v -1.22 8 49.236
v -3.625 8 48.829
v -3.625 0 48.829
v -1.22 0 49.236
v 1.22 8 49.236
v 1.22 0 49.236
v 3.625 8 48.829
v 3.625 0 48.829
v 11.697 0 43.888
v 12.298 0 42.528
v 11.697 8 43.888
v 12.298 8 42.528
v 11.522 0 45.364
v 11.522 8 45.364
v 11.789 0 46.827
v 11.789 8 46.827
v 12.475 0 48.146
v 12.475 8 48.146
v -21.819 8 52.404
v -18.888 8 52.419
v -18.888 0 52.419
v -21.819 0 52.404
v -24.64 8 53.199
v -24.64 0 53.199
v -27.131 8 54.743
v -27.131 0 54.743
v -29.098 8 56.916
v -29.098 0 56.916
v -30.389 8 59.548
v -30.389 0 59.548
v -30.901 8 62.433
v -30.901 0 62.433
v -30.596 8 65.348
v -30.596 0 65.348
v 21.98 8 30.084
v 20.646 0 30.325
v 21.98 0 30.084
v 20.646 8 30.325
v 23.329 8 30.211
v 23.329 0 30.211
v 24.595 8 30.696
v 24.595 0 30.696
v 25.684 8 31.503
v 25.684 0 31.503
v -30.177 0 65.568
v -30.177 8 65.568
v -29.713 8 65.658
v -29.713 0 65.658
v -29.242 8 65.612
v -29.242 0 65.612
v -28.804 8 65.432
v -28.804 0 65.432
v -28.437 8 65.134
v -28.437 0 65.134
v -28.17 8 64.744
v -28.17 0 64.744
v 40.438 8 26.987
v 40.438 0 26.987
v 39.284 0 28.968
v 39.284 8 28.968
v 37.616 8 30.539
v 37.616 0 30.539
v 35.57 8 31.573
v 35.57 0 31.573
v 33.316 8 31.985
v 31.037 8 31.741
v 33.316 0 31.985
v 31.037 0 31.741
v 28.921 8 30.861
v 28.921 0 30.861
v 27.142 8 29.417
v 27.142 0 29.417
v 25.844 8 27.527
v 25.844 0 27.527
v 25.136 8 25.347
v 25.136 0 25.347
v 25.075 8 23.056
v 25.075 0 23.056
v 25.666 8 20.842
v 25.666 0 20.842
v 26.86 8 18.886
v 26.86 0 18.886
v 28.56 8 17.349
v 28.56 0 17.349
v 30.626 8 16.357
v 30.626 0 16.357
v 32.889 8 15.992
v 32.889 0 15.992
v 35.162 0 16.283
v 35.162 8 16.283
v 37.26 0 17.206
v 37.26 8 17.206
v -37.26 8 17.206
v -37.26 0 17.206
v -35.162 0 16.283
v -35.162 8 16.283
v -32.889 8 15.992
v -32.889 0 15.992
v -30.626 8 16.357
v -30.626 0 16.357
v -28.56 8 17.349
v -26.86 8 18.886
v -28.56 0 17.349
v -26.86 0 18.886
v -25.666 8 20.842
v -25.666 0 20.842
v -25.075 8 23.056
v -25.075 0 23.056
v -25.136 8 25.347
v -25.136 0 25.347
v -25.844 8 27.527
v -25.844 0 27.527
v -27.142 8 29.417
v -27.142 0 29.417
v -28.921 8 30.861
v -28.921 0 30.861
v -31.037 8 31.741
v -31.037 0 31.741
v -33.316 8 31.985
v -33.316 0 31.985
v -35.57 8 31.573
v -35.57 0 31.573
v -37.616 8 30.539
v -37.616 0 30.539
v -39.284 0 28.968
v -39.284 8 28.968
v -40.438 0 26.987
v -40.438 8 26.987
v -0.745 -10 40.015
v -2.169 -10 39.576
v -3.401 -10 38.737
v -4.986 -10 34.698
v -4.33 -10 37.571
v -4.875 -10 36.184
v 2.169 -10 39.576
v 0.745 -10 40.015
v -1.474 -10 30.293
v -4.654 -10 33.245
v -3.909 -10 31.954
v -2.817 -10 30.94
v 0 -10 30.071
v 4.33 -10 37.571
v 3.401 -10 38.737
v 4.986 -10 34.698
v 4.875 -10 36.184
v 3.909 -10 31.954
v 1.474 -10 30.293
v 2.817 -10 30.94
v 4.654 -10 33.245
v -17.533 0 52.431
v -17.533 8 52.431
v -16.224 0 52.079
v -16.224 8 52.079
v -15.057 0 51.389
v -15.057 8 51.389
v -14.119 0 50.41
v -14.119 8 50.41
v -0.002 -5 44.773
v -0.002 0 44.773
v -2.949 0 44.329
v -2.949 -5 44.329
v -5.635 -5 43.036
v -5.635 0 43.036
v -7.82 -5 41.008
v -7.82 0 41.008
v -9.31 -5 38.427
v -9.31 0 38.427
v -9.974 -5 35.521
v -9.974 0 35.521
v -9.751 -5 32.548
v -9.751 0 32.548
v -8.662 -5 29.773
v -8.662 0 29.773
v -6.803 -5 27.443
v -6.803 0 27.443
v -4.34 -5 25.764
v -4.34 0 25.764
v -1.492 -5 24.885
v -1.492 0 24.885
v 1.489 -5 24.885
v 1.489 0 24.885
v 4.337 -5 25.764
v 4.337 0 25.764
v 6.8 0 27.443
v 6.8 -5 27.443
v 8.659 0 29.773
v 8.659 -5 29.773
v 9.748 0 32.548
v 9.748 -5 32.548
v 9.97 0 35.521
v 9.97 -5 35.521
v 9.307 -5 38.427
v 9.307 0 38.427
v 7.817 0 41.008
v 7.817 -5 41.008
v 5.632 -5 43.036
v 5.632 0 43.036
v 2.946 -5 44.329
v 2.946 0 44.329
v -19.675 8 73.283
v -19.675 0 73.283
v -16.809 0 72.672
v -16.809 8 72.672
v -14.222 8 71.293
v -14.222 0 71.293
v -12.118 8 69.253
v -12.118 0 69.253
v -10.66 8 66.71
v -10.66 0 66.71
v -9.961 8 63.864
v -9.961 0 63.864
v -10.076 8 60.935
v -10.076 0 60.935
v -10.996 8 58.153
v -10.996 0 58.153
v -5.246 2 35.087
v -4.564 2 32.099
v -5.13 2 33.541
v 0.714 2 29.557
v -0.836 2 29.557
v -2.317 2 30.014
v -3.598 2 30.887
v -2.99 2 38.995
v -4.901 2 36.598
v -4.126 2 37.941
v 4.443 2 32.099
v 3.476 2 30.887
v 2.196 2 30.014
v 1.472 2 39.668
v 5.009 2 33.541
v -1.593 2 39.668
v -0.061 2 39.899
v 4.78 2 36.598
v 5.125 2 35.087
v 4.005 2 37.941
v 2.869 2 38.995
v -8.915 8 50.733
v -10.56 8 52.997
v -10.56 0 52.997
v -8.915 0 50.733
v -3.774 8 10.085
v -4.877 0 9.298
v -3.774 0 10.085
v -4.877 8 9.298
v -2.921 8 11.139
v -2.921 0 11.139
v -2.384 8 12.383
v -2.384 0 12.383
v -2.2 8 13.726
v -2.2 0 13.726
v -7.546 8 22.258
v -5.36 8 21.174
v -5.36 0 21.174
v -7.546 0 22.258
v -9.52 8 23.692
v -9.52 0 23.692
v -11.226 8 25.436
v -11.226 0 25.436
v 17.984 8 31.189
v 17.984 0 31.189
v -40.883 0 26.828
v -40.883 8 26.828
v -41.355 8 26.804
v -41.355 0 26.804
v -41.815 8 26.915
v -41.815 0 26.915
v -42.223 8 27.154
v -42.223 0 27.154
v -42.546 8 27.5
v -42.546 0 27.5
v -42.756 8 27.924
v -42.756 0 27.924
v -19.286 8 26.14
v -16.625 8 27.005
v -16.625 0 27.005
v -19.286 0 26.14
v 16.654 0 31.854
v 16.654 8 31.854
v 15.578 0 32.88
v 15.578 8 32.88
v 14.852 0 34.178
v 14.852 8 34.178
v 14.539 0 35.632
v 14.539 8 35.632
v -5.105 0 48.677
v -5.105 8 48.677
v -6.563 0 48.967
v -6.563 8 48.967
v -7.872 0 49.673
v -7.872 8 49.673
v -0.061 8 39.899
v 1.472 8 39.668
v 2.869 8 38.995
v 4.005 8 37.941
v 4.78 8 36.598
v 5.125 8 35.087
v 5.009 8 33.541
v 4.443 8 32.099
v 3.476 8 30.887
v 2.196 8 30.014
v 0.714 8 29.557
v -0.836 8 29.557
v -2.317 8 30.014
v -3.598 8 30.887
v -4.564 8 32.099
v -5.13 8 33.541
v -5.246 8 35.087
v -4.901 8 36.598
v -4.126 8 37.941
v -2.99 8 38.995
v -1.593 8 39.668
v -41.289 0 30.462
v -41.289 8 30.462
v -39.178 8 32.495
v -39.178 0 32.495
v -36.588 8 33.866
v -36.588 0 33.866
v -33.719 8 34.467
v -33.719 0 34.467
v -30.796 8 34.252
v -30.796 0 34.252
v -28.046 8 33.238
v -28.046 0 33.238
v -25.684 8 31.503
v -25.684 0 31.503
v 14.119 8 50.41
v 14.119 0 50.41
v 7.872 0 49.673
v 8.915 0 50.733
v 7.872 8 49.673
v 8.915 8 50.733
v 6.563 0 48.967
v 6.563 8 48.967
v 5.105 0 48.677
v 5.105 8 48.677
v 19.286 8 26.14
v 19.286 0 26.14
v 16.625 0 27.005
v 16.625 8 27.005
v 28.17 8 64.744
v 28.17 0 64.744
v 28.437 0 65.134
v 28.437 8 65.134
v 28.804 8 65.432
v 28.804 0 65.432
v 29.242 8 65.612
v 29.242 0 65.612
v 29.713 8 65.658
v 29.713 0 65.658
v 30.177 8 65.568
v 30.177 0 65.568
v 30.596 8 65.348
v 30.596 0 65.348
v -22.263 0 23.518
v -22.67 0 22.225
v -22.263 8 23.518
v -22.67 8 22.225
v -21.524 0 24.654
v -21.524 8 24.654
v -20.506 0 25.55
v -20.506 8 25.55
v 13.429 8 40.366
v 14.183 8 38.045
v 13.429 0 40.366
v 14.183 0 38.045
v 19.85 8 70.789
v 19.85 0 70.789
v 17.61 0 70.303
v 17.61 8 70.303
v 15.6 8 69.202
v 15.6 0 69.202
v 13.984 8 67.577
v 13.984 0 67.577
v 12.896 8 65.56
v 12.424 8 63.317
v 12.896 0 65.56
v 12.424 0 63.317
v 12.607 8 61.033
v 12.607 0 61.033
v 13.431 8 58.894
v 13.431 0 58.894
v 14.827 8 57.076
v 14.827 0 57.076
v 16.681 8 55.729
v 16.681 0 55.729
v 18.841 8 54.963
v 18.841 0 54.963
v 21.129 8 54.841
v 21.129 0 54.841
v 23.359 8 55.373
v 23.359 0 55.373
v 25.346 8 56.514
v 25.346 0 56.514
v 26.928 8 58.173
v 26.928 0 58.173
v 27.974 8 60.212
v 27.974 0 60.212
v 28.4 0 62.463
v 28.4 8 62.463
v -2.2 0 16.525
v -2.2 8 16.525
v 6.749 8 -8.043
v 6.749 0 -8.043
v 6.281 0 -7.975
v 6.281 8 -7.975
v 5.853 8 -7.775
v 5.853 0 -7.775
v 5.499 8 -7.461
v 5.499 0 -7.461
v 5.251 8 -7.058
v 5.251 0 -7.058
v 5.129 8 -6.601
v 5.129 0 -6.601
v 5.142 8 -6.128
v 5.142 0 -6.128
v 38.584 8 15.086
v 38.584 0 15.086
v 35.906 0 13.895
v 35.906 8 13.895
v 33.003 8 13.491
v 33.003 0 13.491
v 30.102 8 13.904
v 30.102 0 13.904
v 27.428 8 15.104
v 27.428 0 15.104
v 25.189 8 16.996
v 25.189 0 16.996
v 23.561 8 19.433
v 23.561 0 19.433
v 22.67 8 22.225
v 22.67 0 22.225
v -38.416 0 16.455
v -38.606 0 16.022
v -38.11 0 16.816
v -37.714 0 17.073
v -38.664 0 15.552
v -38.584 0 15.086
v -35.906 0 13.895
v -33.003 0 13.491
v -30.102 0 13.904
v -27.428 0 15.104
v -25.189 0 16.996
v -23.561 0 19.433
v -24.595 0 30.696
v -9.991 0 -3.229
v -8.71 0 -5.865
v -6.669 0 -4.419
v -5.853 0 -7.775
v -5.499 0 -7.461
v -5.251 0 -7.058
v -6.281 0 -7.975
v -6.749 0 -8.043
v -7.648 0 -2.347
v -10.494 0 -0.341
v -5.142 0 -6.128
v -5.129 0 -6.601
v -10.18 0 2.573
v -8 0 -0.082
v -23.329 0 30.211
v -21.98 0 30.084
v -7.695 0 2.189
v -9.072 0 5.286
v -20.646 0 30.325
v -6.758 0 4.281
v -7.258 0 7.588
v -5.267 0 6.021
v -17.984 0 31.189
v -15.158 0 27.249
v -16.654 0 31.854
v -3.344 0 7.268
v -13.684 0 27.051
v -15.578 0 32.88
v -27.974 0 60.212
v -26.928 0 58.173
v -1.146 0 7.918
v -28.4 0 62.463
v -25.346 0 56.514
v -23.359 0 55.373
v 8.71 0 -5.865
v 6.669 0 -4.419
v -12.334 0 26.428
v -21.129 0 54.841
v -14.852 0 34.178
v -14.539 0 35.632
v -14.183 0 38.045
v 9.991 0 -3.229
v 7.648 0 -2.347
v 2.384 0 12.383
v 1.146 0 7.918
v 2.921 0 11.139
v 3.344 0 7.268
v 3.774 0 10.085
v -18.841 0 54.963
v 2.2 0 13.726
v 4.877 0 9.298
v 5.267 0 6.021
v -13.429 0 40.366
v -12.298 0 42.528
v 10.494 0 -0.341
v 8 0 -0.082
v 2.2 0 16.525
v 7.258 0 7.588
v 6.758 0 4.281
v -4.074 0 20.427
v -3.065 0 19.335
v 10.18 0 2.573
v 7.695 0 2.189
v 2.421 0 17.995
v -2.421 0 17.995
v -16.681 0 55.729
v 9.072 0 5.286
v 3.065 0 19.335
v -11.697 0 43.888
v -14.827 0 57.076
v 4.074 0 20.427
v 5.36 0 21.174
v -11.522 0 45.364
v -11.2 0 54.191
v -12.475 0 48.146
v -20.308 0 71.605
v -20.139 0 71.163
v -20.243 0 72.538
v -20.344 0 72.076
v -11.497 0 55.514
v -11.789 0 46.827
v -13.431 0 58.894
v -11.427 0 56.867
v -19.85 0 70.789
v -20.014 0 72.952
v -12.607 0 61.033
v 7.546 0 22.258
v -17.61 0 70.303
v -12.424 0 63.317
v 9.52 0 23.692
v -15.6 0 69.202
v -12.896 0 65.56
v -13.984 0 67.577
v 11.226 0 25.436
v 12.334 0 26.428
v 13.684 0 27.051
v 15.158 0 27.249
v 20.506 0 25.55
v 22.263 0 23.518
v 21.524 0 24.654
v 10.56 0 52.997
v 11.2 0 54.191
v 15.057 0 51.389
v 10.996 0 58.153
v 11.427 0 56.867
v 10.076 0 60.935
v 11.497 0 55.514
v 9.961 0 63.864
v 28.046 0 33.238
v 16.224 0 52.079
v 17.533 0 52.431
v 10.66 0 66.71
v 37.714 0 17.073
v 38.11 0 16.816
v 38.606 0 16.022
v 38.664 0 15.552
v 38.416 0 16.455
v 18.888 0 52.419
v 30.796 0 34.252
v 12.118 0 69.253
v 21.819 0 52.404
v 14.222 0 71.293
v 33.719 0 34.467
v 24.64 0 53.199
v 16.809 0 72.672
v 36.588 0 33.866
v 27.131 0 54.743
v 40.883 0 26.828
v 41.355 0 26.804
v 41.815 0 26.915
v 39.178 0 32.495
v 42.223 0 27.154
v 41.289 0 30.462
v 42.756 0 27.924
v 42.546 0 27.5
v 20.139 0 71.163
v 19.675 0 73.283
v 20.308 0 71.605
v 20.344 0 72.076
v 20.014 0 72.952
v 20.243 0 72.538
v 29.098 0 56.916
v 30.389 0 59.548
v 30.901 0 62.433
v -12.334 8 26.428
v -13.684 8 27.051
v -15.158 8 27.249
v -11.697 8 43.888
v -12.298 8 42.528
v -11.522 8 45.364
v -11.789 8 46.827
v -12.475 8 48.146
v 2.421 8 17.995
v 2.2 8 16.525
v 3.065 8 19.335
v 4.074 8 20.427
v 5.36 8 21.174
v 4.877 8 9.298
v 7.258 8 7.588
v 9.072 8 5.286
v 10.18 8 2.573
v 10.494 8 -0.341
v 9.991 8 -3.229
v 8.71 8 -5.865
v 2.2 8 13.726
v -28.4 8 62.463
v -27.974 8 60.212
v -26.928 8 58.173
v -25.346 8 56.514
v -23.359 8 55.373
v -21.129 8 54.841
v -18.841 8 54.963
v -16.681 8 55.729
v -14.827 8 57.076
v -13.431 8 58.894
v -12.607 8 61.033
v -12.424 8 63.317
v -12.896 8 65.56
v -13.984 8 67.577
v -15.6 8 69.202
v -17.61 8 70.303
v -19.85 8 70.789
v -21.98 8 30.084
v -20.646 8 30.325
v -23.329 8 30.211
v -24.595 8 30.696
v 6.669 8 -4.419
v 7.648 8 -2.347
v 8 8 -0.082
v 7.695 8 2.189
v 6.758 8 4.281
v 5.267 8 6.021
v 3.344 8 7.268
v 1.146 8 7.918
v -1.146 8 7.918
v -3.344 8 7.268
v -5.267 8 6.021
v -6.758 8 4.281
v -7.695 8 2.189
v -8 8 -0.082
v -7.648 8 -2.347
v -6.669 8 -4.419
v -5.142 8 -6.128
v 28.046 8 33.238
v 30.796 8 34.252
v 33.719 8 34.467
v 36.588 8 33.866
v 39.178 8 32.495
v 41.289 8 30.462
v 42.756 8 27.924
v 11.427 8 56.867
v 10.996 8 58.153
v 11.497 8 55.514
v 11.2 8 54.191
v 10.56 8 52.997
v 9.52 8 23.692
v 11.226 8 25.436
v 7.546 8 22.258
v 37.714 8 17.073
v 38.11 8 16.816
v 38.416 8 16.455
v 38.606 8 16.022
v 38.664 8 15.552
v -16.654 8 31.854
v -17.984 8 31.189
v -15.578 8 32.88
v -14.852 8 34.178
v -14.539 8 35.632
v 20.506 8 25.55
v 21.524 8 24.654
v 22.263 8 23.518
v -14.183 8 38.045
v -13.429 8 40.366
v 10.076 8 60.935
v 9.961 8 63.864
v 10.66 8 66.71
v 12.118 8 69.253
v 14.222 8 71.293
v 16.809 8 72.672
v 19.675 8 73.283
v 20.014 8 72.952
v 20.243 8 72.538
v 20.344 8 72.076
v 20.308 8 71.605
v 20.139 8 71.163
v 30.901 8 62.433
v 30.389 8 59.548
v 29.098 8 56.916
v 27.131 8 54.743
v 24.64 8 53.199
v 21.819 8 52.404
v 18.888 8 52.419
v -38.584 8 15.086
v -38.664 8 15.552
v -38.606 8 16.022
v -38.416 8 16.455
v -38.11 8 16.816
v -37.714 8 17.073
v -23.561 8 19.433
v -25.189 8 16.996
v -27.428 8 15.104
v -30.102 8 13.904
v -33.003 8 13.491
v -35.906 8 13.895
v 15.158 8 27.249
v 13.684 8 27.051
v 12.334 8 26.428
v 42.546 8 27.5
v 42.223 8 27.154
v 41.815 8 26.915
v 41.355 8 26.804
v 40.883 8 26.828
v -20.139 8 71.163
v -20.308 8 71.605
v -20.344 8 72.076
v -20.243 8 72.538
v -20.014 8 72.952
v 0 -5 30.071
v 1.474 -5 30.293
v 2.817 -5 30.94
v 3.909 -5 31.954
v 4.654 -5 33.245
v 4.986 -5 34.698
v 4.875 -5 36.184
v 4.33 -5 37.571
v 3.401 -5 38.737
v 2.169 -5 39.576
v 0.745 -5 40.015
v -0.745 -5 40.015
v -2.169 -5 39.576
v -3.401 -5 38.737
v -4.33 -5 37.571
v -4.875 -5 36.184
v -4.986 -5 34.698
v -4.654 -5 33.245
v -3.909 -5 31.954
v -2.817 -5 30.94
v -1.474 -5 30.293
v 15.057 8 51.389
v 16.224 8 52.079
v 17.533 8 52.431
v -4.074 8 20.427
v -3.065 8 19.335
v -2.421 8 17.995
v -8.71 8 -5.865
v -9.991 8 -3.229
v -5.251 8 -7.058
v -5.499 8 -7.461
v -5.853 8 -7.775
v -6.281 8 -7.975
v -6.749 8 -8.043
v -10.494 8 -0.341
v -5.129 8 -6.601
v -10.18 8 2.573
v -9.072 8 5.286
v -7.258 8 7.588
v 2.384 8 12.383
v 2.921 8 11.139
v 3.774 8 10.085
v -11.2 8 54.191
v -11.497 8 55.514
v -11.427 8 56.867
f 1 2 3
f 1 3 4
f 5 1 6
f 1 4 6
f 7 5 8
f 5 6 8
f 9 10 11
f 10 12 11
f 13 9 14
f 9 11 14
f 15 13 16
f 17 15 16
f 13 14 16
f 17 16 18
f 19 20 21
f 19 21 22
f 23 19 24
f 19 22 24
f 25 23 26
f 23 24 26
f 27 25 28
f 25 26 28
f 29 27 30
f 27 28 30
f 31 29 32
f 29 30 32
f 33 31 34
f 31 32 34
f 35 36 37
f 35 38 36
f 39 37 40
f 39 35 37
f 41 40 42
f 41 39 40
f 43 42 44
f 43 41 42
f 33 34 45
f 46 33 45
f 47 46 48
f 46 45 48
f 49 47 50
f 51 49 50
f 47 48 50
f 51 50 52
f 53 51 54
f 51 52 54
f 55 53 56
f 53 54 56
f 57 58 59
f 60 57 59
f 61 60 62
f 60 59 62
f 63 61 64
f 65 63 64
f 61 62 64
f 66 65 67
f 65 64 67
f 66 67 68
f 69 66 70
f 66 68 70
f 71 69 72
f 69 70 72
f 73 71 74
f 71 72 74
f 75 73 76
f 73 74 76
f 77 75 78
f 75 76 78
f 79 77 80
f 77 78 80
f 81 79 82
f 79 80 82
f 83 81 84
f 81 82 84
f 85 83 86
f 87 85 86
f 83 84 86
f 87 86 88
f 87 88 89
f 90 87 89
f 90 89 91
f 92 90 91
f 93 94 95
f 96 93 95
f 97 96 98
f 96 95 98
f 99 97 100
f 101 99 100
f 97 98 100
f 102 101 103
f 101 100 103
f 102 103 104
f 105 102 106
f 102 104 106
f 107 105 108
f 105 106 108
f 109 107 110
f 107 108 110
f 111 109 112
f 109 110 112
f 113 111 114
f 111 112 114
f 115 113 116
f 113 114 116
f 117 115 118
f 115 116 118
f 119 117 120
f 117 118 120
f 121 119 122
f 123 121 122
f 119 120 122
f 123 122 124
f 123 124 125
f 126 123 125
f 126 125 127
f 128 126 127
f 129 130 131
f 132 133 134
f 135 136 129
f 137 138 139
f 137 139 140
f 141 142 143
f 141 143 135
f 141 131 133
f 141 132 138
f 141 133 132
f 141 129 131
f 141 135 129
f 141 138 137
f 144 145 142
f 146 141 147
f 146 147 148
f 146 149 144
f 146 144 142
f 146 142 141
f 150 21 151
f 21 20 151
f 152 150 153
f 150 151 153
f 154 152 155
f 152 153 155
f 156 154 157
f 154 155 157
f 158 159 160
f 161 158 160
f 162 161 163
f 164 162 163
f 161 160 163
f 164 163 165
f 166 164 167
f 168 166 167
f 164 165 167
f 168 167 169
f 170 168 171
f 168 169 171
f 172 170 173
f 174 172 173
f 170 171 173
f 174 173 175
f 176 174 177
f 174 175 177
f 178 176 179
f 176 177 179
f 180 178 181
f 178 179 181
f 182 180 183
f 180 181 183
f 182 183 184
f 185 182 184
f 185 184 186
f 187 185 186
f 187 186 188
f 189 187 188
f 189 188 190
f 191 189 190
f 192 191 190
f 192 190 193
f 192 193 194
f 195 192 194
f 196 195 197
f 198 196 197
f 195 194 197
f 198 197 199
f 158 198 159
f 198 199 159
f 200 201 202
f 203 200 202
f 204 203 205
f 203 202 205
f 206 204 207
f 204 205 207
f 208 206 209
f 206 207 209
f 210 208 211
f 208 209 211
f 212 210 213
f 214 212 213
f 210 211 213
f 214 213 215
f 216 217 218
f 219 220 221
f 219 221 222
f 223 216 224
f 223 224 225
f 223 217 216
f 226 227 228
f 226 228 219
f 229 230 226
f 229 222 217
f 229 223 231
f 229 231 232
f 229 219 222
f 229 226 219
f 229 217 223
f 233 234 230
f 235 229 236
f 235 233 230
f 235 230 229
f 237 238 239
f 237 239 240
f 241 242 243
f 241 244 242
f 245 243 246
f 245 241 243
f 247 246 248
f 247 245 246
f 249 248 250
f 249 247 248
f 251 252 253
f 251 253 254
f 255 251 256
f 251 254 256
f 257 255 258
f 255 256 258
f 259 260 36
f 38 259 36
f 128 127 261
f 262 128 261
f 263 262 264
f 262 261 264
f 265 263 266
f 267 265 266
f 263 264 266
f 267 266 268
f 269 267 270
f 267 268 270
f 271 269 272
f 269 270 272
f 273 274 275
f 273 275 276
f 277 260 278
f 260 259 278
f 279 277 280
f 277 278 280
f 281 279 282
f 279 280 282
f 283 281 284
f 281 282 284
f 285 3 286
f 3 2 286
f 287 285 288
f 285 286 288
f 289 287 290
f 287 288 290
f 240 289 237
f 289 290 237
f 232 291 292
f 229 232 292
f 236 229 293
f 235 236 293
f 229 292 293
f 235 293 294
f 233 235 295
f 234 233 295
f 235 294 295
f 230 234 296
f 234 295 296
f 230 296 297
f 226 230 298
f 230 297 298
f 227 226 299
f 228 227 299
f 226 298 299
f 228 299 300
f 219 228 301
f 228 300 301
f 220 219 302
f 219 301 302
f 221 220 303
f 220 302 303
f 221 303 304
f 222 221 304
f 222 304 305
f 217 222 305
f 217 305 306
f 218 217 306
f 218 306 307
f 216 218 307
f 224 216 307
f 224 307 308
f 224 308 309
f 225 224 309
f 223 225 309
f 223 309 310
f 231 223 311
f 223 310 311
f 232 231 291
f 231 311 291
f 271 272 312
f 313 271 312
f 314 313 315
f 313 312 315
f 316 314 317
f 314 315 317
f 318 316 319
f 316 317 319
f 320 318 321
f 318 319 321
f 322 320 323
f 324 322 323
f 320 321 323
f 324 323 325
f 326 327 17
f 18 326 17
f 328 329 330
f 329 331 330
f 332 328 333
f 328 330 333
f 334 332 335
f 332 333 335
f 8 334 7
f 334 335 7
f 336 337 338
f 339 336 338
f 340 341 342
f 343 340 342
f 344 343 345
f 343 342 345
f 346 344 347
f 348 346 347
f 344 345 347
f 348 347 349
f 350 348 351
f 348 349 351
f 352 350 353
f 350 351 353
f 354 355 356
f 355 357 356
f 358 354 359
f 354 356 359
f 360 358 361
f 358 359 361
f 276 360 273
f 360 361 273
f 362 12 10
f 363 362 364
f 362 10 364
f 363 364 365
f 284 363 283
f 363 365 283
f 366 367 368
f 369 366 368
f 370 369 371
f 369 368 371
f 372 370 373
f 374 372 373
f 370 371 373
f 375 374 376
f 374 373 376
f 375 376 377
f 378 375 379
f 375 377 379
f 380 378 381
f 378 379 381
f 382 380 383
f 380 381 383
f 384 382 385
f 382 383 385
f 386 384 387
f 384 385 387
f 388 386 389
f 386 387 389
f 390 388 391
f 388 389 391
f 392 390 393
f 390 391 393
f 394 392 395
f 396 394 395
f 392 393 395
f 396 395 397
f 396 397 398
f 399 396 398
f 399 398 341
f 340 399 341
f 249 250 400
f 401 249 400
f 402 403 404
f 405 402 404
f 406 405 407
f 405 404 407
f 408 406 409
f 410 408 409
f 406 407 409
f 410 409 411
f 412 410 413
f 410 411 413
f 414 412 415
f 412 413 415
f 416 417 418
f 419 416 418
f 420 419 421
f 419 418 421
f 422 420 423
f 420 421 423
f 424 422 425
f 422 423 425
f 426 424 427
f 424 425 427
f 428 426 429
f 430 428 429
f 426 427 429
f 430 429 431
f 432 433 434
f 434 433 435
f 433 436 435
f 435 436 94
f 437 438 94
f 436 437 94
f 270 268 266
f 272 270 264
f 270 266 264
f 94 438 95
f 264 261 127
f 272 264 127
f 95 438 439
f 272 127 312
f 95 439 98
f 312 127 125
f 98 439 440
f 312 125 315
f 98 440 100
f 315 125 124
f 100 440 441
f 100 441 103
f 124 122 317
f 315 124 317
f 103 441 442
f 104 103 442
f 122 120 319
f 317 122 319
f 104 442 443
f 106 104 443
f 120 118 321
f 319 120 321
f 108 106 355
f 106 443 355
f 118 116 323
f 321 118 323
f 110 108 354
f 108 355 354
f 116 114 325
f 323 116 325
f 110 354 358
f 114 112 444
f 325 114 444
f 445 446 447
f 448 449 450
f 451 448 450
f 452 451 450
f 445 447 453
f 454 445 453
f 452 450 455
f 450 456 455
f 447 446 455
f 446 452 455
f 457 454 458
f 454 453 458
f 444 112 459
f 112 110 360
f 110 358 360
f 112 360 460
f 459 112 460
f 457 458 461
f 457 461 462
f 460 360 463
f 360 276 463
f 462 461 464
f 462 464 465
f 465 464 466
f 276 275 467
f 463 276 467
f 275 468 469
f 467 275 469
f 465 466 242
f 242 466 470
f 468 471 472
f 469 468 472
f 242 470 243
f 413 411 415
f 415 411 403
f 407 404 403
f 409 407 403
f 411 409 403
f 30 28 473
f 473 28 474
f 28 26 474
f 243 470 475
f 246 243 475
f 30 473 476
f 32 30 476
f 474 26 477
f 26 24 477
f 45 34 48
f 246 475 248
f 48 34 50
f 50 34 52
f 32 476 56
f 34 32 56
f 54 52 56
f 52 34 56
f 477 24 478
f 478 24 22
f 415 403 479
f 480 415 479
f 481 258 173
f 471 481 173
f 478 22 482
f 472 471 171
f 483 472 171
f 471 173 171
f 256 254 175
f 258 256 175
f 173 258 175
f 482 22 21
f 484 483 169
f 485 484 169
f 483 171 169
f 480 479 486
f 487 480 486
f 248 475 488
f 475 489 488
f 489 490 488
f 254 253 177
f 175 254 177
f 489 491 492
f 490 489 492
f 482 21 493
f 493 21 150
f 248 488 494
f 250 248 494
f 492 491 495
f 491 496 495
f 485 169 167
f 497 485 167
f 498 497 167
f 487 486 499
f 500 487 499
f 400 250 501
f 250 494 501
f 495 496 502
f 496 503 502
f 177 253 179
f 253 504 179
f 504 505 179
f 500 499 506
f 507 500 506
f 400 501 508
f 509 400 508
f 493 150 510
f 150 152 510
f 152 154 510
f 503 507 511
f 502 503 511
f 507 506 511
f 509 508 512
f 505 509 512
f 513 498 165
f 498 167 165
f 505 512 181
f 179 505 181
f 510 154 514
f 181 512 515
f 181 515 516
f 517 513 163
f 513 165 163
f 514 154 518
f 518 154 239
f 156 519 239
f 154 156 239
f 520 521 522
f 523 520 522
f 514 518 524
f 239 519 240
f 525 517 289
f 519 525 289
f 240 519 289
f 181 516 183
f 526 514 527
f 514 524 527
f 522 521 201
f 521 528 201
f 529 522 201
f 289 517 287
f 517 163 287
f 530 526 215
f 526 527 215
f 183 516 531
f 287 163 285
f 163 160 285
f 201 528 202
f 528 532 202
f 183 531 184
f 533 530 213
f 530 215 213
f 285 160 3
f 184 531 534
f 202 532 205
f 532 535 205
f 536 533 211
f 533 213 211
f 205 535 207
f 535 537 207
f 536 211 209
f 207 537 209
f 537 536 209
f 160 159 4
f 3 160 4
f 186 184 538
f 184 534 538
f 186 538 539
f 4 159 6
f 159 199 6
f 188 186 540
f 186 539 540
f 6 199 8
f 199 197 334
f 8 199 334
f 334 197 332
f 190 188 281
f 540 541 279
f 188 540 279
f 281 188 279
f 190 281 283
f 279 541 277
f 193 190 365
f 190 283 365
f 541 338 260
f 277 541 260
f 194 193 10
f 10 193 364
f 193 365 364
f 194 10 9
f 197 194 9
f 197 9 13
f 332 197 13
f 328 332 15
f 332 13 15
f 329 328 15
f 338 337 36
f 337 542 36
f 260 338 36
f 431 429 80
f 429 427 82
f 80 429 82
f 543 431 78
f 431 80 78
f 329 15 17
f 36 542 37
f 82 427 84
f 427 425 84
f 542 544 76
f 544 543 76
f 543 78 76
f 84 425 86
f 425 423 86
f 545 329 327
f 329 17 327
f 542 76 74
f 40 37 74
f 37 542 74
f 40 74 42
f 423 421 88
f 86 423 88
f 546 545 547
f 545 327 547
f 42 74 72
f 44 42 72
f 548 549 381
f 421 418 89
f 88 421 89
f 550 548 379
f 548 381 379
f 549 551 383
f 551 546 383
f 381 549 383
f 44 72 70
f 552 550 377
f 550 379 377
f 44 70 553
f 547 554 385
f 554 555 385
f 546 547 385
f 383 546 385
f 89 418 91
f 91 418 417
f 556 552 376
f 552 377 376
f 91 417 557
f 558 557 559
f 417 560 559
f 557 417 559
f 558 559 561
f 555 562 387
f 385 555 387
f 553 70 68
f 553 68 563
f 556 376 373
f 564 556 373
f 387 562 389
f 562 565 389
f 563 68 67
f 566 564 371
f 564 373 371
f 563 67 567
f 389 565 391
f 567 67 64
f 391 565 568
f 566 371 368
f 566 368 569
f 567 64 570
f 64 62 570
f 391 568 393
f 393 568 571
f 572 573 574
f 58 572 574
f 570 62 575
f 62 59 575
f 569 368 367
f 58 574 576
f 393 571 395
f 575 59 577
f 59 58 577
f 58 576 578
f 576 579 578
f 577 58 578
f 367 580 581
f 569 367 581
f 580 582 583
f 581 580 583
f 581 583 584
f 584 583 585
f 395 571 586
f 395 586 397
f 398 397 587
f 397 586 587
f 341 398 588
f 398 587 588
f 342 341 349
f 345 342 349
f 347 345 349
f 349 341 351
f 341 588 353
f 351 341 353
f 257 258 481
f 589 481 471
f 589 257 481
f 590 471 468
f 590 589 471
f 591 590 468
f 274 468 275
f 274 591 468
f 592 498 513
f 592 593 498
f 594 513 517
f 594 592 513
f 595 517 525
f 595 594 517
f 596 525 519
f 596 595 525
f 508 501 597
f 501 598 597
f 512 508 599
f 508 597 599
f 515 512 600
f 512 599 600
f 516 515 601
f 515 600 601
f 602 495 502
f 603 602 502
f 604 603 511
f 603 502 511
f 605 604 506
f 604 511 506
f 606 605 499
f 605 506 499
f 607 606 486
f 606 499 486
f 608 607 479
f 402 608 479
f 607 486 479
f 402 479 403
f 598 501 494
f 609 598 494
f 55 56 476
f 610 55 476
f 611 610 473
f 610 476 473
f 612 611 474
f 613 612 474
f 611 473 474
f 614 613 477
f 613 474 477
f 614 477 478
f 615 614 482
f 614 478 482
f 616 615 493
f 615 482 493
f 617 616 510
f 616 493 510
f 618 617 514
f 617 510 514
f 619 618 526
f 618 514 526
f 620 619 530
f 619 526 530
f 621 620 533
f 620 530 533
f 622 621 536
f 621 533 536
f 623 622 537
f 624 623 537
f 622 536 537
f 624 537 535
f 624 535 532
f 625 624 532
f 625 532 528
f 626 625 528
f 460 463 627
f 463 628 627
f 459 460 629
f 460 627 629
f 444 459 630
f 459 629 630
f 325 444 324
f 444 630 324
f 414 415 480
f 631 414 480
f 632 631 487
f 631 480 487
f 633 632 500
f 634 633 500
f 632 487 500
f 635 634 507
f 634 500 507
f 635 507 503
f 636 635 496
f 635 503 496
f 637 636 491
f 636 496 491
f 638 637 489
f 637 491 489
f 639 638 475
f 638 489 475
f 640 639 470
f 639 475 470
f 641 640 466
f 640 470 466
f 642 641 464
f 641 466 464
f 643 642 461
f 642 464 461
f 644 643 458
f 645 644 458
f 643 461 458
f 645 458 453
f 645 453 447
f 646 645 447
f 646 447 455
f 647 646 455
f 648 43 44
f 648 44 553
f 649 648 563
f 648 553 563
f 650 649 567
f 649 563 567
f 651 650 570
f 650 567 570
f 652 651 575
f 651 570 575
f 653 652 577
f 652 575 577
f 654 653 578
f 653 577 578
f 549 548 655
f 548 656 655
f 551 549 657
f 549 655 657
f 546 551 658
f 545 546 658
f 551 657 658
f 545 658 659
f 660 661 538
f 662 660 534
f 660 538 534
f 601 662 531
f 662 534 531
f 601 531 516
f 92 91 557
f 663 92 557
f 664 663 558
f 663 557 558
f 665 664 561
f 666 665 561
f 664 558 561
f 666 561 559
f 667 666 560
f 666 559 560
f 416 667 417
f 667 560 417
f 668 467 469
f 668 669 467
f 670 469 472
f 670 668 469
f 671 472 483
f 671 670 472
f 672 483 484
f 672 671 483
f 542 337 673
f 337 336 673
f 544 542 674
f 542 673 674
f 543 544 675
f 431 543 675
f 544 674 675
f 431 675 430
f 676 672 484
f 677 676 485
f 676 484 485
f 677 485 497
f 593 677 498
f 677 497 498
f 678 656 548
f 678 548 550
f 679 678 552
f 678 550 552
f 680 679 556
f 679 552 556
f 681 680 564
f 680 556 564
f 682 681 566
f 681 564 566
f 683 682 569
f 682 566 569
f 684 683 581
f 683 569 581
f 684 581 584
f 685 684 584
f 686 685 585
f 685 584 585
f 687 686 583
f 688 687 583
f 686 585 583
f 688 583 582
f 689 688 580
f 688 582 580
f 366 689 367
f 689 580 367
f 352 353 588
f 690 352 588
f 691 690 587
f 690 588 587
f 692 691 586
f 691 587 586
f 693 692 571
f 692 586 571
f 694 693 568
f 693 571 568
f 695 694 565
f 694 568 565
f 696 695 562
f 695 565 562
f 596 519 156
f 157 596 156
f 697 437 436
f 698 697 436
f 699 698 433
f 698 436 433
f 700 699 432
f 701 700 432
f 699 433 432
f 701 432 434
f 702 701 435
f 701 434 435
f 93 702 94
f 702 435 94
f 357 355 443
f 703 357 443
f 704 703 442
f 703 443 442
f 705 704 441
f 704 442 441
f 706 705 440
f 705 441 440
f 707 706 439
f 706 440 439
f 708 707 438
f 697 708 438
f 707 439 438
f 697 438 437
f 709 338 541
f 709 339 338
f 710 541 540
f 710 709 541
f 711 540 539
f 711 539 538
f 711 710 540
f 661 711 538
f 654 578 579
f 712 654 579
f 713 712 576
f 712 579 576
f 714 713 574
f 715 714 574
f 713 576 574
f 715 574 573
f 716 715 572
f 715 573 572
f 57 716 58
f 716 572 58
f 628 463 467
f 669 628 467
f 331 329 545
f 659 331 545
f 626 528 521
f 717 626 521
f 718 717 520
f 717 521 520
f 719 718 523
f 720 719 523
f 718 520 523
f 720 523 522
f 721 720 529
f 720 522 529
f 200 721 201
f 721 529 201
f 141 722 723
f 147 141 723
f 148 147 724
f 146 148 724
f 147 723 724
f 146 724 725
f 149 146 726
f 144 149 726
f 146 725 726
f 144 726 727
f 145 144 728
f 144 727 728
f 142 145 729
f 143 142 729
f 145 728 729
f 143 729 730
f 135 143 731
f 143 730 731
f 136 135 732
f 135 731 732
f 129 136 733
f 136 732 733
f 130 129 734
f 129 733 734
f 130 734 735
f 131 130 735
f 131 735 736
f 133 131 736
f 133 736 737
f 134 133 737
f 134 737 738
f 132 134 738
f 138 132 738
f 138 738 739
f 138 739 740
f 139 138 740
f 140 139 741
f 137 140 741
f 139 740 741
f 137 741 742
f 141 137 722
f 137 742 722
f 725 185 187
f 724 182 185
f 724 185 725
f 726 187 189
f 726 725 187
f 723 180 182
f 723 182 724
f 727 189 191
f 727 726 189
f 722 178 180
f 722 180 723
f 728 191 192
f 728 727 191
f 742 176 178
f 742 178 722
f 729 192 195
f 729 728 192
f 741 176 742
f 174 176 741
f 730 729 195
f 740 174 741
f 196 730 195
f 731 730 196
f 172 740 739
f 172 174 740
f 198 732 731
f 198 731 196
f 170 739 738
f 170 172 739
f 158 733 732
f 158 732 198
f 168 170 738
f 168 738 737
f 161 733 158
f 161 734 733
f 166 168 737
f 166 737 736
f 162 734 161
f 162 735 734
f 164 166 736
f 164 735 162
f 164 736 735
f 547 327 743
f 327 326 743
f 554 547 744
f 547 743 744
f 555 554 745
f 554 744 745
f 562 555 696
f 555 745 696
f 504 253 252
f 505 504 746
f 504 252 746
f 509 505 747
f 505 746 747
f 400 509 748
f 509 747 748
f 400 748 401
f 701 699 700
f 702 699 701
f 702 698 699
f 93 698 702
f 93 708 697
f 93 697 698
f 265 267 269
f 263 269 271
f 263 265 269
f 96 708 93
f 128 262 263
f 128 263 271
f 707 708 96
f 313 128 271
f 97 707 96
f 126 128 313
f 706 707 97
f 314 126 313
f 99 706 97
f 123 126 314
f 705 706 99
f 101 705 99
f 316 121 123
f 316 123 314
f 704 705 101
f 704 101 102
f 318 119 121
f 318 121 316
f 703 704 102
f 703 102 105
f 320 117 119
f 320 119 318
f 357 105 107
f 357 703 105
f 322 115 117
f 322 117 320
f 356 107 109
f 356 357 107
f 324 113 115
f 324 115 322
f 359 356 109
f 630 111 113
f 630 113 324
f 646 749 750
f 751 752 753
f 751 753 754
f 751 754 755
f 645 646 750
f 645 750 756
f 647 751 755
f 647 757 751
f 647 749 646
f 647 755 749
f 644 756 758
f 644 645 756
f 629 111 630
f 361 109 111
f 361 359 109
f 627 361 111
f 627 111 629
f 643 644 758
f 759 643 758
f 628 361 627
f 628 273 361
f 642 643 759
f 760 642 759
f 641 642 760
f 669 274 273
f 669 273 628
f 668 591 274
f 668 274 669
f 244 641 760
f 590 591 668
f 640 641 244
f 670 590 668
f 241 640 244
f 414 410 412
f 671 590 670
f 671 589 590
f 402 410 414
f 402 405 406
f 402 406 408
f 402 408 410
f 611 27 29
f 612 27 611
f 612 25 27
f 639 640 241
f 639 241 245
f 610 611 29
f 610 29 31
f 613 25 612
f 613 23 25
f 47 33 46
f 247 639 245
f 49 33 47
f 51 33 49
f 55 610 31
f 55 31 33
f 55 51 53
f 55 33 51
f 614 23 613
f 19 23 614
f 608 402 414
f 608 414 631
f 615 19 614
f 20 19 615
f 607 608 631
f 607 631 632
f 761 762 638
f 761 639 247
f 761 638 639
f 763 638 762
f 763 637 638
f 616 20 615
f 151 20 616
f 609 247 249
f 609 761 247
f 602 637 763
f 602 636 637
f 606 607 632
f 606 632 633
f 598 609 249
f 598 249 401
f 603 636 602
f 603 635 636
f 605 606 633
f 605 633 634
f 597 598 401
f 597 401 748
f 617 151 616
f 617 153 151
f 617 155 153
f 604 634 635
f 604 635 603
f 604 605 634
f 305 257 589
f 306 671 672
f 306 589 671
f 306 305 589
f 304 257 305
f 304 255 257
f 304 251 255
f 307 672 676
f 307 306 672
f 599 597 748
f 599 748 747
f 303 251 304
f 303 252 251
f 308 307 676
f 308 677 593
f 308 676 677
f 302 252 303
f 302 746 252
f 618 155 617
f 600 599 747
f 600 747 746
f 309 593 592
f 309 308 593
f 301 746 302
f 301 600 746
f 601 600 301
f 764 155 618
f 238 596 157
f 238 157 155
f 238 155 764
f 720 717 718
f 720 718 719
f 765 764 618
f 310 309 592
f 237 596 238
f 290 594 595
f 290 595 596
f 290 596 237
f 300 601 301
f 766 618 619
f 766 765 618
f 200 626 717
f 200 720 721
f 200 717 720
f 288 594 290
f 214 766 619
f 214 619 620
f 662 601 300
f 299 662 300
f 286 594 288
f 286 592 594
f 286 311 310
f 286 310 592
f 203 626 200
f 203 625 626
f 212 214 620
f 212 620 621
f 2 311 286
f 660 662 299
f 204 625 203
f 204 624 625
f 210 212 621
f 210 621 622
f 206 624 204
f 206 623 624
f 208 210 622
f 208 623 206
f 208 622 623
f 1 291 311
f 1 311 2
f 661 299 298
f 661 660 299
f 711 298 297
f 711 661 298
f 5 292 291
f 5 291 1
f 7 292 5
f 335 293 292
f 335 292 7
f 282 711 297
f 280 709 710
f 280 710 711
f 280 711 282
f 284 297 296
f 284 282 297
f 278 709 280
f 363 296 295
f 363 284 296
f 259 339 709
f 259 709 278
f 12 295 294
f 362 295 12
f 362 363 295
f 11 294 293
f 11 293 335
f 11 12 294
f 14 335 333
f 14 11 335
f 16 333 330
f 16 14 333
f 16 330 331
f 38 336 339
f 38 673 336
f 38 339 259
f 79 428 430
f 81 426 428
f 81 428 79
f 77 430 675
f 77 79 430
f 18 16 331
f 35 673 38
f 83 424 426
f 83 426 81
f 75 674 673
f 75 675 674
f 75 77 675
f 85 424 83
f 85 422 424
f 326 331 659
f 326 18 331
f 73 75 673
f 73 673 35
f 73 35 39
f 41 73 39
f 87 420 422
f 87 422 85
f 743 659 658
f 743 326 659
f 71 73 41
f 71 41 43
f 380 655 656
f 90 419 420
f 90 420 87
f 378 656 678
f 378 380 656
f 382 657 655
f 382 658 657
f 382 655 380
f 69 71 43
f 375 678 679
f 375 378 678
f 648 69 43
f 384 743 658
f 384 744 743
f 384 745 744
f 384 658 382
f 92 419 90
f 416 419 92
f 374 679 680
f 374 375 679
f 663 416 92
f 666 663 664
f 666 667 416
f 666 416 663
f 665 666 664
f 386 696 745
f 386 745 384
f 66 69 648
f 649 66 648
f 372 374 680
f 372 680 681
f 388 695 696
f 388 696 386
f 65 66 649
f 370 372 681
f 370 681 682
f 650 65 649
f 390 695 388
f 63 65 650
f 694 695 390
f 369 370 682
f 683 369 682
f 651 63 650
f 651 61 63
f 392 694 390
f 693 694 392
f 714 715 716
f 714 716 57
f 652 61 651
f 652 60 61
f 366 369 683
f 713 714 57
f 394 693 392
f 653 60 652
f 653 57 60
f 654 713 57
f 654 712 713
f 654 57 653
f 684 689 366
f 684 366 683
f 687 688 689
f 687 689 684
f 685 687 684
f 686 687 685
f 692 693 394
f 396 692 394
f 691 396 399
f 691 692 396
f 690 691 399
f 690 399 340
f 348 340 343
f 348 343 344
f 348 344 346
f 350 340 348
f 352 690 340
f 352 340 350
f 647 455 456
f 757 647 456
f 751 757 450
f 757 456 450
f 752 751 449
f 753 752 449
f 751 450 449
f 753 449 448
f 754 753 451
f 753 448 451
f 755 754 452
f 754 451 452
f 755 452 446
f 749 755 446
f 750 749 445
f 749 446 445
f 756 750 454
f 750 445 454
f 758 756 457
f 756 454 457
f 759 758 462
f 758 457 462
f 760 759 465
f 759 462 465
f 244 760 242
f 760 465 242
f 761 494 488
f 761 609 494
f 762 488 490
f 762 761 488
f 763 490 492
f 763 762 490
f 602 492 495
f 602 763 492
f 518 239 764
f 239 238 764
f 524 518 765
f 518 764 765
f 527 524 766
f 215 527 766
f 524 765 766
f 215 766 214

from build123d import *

# Parameters (mm, degrees)
BOSS_EXTRU_1_DEPTH                 = 8
ESQUISSE5_R                        = 14.567729557
BOSS_EXTRU_2_DEPTH                 = 8
CONG_1_R                           = 5
CONG_2_R                           = 5
R_P_TITION_CIRCULAIRE8_COUNT       = 5
CONG_1_OF_R_P_TITION_CIRCULAIRE8_R = 5
CONG_2_OF_R_P_TITION_CIRCULAIRE8_R = 5
ESQUISSE9_R                        = 10
BOSS_EXTRU_4_DEPTH                 = 5
ESQUISSE10_R                       = 5
BOSS_EXTRU_5_DEPTH                 = 5
ESQUISSE12_R                       = 5.2
ENL_V_MAT_EXTRU_3_DEPTH            = 6


with BuildPart() as part:
    # Esquisse4 → Boss.-Extru.1 (new body)
    with BuildSketch(Plane(origin=(0, 0, 0), x_dir=(1, 0, 0), z_dir=(0, 1, 0))):
        with BuildLine():
            Line((2.2, -20.318922986), (2.2, -10.266937226))
            ThreePointArc((2.2, -10.266937226), (10.190195312, -2.531781884), (6.749269902, 8.043466653))
            ThreePointArc((6.749269902, 8.043466653), (5.499269902, 7.46058208), (5.142300877, 6.128355545))
            ThreePointArc((5.142300877, 6.128355545), (0, -8), (-5.142300877, 6.128355545))
            ThreePointArc((-5.142300877, 6.128355545), (-5.499269902, 7.46058208), (-6.749269902, 8.043466653))
            ThreePointArc((-6.749269902, 8.043466653), (-10.190195312, -2.531781884), (-2.2, -10.266937226))
            Line((-2.2, -10.266937226), (-2.2, -20.318922986))
            ThreePointArc((-2.2, -20.318922986), (0, -20.179612502), (2.2, -20.318922986))
        make_face()
    boss_extru_1 = extrude(amount=BOSS_EXTRU_1_DEPTH)

    # Esquisse5 → Boss.-Extru.2 (add)
    with BuildSketch(Plane(origin=(0, 0, 0), x_dir=(1, 0, 0), z_dir=(0, 1, 0))):
        with Locations((0, -34.71957382)):
            Circle(ESQUISSE5_R)
    extrude(amount=BOSS_EXTRU_2_DEPTH)

    # Congé1
    cong_1_edges = [part.edges().sort_by_distance(p)[0] for p in [
        (2.2, 4, 10.266937226),
        (-2.2, 4, 10.266937226),
    ]]
    fillet(cong_1_edges, radius=CONG_1_R)

    # Congé2
    cong_2_edges = [part.edges().sort_by_distance(p)[0] for p in [
        (2.2, 4, 20.318922986),
        (-2.2, 4, 20.318922986),
    ]]
    fillet(cong_2_edges, radius=CONG_2_R)

    # Répétition circulaire8: Boss.-Extru.1 ×5 about axis
    r_p_tition_circulaire8_axis = Axis((0, 0, 34.71957382), (0, 1, 0))
    for i in range(1, R_P_TITION_CIRCULAIRE8_COUNT):
        add(boss_extru_1.rotate(r_p_tition_circulaire8_axis, i * 360 / R_P_TITION_CIRCULAIRE8_COUNT))

    # Congé1 of Répétition circulaire8
    cong_1_of_r_p_tition_circulaire8_edges = [part.edges().sort_by_distance(p)[0] for p in [
        (-22.576001986, 4, 25.070969219),
        (-23.935676761, 4, 29.255617891),
        (-16.152736557, 4, 53.209044827),
        (-12.593061782, 4, 55.795299938),
        (12.593061782, 4, 55.795299938),
        (16.152736557, 4, 53.209044827),
        (23.935676761, 4, 29.255617891),
        (22.576001986, 4, 25.070969219),
    ]]
    fillet(cong_1_of_r_p_tition_circulaire8_edges, radius=CONG_1_OF_R_P_TITION_CIRCULAIRE8_R)

    # Congé2 of Répétition circulaire8
    cong_2_of_r_p_tition_circulaire8_edges = [part.edges().sort_by_distance(p)[0] for p in [
        (-13.015995427, 4, 28.177203647),
        (-14.375670202, 4, 32.361852318),
        (-10.244327571, 4, 45.07681752),
        (-6.684652796, 4, 47.66307263),
        (6.684652796, 4, 47.66307263),
        (10.244327571, 4, 45.07681752),
        (14.375670202, 4, 32.361852318),
        (13.015995427, 4, 28.177203647),
    ]]
    fillet(cong_2_of_r_p_tition_circulaire8_edges, radius=CONG_2_OF_R_P_TITION_CIRCULAIRE8_R)

    # Esquisse9 → Boss.-Extru.4 (add)
    with BuildSketch(Plane.XZ):
        with Locations(Location((-0.001570364, 34.773487041, 0), (0, 0, 90))):
            Circle(ESQUISSE9_R)
    extrude(amount=BOSS_EXTRU_4_DEPTH)

    # Esquisse10 → Boss.-Extru.5 (add)
    with BuildSketch(Plane.XZ.offset(5)):
        with Locations(Location((0, 35.07133439, 0), (0, 0, 270))):
            Circle(ESQUISSE10_R)
    extrude(amount=BOSS_EXTRU_5_DEPTH)

    # Esquisse12 → Enlèv. mat.-Extru.3 (cut)
    with BuildSketch(Plane(origin=(0, 8, 0), x_dir=(1, 0, 0), z_dir=(0, 1, 0))):
        with Locations(Location((-0.060638465, -34.698547828, 0), (0, 0, 270))):
            Circle(ESQUISSE12_R)
    extrude(amount=-ENL_V_MAT_EXTRU_3_DEPTH, mode=Mode.SUBTRACT)


solid = part.part
